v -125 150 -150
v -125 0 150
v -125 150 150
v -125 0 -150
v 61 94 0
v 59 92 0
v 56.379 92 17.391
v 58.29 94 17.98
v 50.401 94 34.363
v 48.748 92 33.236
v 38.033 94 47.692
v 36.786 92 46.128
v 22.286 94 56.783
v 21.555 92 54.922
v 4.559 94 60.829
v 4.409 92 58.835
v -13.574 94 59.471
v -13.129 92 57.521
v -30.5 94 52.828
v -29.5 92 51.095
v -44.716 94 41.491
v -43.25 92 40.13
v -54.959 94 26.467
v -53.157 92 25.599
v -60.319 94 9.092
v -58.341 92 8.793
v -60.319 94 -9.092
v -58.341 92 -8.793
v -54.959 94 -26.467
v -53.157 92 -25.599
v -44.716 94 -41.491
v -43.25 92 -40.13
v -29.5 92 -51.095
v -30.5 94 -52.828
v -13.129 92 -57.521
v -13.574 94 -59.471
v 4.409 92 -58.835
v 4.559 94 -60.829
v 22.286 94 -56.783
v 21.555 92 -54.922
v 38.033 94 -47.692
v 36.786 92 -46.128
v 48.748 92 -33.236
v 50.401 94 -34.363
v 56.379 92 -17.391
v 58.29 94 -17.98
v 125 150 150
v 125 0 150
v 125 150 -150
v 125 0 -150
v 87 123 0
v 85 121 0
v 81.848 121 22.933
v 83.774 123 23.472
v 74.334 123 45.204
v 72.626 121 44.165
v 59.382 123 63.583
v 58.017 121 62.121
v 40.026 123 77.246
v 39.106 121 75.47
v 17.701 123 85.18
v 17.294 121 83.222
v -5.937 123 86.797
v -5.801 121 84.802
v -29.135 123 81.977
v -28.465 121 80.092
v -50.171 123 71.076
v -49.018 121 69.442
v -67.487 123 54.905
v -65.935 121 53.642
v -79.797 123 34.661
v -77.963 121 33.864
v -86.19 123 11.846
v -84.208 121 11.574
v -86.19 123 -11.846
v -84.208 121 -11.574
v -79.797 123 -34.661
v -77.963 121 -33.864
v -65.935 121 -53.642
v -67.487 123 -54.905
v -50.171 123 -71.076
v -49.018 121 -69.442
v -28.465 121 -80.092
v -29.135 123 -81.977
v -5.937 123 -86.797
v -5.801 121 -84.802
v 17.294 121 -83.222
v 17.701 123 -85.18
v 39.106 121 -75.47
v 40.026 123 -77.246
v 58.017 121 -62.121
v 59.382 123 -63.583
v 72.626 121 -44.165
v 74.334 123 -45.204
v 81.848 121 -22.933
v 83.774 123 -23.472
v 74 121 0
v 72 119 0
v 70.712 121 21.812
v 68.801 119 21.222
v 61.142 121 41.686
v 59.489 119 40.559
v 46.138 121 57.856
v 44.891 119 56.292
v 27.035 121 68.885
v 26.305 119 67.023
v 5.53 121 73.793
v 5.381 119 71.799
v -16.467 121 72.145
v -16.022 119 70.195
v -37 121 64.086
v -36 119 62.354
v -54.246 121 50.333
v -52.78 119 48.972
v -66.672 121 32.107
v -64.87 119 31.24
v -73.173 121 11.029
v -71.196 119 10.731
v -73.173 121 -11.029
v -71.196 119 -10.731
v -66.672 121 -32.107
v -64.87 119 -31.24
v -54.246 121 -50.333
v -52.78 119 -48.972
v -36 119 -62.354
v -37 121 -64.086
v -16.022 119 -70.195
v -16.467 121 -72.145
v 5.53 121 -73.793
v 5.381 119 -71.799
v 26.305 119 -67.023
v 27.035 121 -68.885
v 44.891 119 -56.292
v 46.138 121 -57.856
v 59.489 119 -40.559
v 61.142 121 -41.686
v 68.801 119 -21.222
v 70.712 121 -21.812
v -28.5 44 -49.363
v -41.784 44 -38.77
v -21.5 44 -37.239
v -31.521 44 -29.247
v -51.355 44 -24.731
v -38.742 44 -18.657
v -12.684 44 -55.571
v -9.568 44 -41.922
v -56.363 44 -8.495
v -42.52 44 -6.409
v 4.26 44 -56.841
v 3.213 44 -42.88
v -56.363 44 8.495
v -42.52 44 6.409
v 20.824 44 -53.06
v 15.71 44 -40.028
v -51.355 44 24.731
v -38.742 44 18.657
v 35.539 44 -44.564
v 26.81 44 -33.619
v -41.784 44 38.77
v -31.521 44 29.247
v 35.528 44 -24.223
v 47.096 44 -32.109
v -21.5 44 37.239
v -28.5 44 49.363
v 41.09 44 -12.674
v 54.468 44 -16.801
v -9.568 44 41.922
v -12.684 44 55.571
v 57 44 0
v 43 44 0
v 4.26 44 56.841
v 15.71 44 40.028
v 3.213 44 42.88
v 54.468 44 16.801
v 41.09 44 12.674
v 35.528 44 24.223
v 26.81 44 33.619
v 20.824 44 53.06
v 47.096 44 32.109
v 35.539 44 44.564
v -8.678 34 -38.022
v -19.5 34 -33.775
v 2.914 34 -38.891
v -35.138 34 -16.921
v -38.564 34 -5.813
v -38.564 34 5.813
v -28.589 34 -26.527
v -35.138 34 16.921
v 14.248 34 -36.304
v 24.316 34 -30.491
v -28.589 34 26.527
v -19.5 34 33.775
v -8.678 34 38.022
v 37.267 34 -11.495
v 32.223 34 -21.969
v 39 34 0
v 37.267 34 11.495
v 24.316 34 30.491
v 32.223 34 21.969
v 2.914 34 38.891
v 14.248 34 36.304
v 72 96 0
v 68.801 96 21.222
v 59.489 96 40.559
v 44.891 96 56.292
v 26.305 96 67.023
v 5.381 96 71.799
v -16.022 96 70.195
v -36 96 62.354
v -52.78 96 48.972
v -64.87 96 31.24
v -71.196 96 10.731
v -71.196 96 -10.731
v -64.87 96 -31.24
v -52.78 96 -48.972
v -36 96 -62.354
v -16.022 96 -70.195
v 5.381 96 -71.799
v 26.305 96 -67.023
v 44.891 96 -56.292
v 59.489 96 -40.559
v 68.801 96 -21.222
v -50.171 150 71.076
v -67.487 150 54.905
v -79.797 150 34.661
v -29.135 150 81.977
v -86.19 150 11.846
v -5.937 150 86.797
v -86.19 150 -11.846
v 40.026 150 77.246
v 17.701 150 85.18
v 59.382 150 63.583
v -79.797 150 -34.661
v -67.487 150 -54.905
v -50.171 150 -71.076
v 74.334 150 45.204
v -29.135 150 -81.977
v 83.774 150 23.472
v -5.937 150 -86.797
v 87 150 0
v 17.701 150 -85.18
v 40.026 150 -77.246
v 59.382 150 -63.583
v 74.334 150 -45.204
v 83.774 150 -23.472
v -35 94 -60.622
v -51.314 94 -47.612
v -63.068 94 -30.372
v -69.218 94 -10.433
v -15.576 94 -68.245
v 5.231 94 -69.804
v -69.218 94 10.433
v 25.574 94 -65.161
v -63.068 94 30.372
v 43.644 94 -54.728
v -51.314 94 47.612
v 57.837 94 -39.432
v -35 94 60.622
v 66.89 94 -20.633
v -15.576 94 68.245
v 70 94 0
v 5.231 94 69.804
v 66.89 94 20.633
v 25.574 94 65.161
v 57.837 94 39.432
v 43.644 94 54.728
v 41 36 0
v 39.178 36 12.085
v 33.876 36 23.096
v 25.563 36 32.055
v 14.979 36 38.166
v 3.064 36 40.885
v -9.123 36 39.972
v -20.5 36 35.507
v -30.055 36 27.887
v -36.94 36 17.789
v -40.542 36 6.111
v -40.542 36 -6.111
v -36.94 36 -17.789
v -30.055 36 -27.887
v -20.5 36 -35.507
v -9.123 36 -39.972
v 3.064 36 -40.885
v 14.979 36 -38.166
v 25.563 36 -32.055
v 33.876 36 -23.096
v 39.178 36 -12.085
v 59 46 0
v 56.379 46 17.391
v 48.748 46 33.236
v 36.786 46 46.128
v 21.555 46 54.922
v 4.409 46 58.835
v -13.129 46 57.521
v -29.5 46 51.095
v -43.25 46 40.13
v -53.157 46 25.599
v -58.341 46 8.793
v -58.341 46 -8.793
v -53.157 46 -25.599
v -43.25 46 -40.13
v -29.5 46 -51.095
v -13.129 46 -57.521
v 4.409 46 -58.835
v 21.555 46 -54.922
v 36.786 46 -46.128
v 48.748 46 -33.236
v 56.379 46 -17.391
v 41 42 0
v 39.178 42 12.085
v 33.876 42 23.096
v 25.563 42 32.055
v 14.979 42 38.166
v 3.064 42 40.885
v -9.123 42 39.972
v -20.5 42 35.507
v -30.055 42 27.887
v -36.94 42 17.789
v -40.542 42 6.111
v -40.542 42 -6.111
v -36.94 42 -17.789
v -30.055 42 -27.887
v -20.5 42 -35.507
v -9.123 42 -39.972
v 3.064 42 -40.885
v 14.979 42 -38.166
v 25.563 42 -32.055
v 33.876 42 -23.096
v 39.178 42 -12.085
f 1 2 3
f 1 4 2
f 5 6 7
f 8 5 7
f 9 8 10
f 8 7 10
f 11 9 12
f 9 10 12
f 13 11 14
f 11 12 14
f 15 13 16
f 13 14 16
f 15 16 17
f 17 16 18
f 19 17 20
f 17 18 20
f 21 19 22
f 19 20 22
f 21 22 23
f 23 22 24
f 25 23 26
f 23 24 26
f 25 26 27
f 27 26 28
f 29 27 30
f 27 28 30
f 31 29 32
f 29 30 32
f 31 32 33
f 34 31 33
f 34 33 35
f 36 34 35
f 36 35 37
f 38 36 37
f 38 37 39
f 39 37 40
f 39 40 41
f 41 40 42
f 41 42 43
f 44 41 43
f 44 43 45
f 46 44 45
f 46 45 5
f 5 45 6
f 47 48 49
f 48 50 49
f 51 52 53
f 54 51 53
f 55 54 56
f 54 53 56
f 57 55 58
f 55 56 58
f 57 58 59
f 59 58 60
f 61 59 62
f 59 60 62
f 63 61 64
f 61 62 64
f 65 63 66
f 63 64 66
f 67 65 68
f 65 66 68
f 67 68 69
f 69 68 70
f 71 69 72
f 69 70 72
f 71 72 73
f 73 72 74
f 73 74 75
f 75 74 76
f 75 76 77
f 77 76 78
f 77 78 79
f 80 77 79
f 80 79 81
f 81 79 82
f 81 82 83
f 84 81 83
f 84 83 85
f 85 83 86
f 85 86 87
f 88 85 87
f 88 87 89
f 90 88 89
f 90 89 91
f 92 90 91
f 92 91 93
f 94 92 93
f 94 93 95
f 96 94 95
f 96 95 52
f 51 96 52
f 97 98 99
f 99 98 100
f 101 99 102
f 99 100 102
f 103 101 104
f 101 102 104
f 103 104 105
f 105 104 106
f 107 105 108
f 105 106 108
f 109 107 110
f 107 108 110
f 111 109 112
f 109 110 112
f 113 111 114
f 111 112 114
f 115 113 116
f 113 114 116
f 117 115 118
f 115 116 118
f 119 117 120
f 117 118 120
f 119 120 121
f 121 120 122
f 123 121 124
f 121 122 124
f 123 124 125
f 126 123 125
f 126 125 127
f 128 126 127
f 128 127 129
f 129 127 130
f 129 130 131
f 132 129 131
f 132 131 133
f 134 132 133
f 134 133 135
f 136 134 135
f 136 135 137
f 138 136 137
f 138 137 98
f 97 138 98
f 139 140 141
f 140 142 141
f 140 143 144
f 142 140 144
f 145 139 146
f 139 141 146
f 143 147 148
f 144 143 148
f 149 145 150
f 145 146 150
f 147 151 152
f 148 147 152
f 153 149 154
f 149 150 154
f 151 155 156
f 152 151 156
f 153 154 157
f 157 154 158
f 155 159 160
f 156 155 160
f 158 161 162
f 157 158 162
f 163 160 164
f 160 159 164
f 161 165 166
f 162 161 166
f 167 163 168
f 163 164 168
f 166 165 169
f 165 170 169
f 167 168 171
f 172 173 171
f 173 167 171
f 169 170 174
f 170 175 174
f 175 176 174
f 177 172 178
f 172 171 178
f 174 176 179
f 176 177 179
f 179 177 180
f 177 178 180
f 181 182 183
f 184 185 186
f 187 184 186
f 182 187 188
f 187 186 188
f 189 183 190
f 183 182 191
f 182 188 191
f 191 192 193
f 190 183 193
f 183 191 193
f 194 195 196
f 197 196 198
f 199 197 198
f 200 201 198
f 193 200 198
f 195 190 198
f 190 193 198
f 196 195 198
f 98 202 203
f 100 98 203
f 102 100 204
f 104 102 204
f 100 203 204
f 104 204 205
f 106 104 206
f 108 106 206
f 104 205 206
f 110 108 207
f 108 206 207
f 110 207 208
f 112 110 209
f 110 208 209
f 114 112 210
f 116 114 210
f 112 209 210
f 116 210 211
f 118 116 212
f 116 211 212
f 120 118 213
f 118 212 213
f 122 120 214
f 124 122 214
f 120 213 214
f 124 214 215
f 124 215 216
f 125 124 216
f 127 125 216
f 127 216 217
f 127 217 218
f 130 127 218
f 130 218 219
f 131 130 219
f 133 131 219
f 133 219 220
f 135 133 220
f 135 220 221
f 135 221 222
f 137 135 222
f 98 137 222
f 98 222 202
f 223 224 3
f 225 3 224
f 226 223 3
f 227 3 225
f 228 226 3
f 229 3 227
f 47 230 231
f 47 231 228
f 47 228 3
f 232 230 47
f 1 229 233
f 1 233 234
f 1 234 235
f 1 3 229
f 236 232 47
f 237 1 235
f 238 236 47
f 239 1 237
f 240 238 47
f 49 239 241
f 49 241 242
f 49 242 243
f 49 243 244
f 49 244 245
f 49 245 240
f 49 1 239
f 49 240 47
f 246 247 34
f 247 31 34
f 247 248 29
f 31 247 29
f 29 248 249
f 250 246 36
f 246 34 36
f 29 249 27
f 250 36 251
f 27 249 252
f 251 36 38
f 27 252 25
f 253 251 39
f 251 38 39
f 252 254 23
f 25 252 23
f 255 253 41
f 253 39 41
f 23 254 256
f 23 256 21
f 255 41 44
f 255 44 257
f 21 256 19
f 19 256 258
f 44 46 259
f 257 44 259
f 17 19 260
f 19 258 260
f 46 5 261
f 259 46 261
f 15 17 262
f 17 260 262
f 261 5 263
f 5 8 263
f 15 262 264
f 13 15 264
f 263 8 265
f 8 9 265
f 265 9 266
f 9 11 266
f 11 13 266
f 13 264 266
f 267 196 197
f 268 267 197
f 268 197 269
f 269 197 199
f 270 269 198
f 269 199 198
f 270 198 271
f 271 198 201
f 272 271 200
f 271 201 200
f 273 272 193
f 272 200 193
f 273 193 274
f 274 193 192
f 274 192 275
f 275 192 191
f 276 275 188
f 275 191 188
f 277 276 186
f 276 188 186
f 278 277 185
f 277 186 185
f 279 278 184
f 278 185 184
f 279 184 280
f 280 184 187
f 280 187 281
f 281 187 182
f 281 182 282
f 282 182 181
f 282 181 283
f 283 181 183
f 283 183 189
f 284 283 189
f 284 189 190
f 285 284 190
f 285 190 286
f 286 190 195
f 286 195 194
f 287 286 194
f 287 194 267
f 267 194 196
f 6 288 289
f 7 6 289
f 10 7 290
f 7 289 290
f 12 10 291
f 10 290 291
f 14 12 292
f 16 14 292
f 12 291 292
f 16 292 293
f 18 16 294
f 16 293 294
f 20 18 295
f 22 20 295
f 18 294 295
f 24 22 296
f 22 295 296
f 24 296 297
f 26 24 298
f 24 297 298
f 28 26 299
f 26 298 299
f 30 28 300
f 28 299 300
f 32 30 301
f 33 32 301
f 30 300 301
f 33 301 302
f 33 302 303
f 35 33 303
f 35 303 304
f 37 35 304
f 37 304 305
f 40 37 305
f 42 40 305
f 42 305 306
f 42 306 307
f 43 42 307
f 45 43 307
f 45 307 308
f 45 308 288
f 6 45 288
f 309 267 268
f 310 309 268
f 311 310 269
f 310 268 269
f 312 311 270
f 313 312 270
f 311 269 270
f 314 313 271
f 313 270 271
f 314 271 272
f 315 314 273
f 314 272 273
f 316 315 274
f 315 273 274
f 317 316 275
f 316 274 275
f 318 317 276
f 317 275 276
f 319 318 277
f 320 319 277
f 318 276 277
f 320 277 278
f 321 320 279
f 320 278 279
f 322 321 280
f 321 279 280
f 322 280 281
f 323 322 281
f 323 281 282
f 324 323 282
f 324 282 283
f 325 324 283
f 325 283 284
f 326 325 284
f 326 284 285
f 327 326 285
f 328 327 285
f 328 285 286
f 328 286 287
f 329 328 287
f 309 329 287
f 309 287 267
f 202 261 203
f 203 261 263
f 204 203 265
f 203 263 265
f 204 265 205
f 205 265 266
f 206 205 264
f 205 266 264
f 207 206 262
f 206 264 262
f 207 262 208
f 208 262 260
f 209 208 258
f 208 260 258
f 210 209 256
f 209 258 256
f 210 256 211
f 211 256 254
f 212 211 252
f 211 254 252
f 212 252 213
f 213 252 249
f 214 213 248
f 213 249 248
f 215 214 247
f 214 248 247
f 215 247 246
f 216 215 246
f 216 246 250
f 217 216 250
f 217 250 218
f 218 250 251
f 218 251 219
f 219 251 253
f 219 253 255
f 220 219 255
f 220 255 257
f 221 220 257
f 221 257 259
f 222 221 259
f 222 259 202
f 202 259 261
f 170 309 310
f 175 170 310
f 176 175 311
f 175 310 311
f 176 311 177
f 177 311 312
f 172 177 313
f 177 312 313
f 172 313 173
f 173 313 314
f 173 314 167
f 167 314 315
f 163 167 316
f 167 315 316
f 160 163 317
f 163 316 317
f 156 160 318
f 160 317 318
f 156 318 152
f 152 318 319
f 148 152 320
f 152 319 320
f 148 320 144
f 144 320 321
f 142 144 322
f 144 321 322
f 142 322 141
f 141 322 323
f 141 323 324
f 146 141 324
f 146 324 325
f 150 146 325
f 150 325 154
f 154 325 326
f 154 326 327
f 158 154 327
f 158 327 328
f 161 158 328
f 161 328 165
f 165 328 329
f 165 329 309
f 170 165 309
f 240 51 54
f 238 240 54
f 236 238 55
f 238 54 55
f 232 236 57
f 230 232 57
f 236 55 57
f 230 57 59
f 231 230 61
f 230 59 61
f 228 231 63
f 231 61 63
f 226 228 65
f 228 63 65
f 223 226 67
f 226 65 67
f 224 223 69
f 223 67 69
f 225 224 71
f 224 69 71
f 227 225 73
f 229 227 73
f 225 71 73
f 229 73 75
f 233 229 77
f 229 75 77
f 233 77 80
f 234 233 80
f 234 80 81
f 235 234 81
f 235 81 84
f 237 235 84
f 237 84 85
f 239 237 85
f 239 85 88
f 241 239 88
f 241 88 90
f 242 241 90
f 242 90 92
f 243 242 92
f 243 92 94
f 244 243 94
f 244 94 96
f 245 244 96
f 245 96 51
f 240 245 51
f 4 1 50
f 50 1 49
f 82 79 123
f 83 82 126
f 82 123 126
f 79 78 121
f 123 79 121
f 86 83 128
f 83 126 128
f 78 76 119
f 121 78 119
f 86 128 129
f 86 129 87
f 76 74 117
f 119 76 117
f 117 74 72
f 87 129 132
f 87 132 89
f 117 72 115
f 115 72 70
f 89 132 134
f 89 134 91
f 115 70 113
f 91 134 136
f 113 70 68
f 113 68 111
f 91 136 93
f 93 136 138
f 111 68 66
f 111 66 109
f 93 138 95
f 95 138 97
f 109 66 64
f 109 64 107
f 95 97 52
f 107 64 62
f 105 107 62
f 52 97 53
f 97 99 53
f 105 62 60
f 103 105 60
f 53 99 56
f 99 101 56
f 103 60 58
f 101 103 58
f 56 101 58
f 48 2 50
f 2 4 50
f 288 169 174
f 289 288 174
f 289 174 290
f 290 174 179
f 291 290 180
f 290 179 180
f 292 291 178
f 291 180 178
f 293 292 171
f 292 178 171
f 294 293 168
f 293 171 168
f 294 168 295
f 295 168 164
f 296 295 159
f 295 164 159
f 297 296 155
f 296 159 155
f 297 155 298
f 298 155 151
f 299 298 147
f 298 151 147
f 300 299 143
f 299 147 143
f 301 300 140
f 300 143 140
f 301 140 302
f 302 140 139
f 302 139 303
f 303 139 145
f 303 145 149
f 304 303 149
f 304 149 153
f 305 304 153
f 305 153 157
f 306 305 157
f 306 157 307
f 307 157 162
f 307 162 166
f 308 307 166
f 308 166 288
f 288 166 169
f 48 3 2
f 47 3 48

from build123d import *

# Parameters (mm, degrees)
SKETCH1_W           = 250
SKETCH1_H           = 150
BOSS_EXTRUDE1_DEPTH = 150


with BuildPart() as part:
    # Sketch1 → Boss-Extrude1 (new body)
    with BuildSketch(Plane.XY):
        with Locations((0, 75)):
            Rectangle(SKETCH1_W, SKETCH1_H)
    boss_extrude1 = extrude(amount=-BOSS_EXTRUDE1_DEPTH)

    # Sketch2 → Cut-Revolve1 (revolve, cut)
    with BuildSketch(Plane.XY):
        Polygon((0, 150), (87, 150), (87, 123), (85, 121), (74, 121), (72, 119), (72, 96), (70, 94), (61, 94), (59, 92), (59, 46), (57, 44), (43, 44), (41, 42), (41, 36), (39, 34), (0, 34), align=None)
    cut_revolve1 = revolve(axis=Axis((0, 0, 0), (0, 1, 0)), mode=Mode.SUBTRACT)

    # Mirror1: Boss-Extrude1, Cut-Revolve1 across plane
    add(boss_extrude1.mirror(Plane(origin=(0, 0, 0), x_dir=(1, 0, 0), z_dir=(0, 0, -1))))
    add(cut_revolve1.mirror(Plane(origin=(0, 0, 0), x_dir=(1, 0, 0), z_dir=(0, 0, -1))), mode=Mode.SUBTRACT)


solid = part.part
